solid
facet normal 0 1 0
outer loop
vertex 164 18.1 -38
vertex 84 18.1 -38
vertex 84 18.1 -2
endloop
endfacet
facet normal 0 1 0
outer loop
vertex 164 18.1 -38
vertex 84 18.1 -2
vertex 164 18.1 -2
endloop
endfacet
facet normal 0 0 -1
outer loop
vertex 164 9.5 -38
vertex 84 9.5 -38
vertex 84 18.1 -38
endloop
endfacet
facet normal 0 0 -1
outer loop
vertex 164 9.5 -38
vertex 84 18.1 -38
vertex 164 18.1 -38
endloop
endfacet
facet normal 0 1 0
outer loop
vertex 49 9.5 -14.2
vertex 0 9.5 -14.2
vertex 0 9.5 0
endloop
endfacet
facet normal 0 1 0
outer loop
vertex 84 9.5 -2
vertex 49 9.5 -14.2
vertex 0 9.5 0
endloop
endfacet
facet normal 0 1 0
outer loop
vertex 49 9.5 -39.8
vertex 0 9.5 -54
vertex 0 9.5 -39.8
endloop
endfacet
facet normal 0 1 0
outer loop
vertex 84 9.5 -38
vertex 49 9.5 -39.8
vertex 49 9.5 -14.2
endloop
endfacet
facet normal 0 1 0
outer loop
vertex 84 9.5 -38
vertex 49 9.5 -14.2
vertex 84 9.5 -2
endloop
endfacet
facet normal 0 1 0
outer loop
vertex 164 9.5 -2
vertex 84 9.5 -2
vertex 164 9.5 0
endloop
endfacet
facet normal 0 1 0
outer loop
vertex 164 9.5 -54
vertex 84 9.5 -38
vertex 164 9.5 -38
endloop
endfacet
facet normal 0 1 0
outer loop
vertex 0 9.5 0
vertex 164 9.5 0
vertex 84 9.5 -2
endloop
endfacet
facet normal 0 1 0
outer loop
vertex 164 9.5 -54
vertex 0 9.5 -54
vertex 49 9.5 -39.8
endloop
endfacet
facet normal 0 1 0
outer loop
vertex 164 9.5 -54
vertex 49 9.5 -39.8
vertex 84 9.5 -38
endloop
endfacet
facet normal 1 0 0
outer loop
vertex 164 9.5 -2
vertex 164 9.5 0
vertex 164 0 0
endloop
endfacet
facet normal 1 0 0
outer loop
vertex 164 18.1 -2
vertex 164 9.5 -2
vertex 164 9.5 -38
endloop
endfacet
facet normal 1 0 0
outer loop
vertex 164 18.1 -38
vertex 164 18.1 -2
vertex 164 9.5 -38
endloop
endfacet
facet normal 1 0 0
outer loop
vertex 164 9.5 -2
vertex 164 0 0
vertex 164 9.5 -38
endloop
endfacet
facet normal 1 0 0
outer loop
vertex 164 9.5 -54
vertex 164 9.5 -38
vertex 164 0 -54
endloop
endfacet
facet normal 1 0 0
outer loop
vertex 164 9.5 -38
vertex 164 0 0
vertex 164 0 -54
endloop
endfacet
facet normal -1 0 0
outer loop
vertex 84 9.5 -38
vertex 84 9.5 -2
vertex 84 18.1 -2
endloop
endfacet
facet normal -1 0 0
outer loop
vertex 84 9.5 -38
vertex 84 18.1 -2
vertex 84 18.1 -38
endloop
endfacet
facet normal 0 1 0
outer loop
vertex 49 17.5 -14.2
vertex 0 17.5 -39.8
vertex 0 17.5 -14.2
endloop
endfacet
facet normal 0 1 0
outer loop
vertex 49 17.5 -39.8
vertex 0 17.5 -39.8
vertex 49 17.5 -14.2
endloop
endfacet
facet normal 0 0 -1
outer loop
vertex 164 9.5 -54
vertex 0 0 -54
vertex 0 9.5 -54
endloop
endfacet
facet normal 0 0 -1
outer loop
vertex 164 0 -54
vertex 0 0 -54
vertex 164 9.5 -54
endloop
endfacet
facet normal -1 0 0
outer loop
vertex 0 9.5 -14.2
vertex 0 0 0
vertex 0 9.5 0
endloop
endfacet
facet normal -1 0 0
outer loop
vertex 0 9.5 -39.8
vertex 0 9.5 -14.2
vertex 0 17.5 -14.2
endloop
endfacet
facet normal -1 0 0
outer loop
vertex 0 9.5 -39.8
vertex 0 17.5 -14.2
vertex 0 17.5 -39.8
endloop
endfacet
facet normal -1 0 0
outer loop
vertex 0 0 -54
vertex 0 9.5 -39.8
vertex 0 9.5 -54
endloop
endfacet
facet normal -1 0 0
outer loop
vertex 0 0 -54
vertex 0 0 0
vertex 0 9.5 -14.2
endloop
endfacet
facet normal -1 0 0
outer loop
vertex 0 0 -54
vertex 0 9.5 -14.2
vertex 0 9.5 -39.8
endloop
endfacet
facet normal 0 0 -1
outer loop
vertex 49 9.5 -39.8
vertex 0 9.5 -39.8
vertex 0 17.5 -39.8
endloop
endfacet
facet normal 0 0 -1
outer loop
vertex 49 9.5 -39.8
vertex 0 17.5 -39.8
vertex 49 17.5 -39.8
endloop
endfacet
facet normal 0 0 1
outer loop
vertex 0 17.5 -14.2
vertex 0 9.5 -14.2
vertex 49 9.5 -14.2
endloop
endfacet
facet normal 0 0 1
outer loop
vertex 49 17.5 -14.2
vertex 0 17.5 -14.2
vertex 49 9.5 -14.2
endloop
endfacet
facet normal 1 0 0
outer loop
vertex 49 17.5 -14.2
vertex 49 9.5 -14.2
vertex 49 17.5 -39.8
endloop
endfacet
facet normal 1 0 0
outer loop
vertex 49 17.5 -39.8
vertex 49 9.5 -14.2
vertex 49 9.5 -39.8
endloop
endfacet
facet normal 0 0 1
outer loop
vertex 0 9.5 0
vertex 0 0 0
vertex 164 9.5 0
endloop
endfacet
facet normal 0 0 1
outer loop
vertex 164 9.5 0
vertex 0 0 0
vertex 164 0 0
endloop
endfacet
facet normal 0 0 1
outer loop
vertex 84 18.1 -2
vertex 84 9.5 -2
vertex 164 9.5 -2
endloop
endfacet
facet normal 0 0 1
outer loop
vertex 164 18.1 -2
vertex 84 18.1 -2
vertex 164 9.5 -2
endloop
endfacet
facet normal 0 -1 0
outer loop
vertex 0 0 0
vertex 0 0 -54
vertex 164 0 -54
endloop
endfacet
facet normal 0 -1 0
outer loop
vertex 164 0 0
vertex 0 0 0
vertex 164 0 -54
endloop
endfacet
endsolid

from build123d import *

# Parameters (mm, degrees)
SKETCH1_W           = 164
SKETCH1_H           = 54
BOSS_EXTRUDE1_DEPTH = 9.5
SKETCH3_W           = 49
SKETCH3_H           = 25.6
BOSS_EXTRUDE2_DEPTH = 8
SKETCH5_W           = 80
SKETCH5_H           = 36
BOSS_EXTRUDE3_DEPTH = 8.6


with BuildPart() as part:
    # Sketch1 → Boss-Extrude1 (new body)
    with BuildSketch(Plane(origin=(0, 0, 0), x_dir=(1, 0, 0), z_dir=(0, 1, 0))):
        with Locations((82, 27)):
            Rectangle(SKETCH1_W, SKETCH1_H)
    extrude(amount=BOSS_EXTRUDE1_DEPTH)

    # Sketch3 → Boss-Extrude2 (add)
    with BuildSketch(Plane(origin=(0, 9.5, 0), x_dir=(1, 0, 0), z_dir=(0, 1, 0))):
        with Locations((24.5, 27)):
            Rectangle(SKETCH3_W, SKETCH3_H)
    extrude(amount=BOSS_EXTRUDE2_DEPTH)

    # Sketch5 → Boss-Extrude3 (add)
    with BuildSketch(Plane(origin=(0, 9.5, 0), x_dir=(1, 0, 0), z_dir=(0, 1, 0))):
        with Locations((124, 20)):
            Rectangle(SKETCH5_W, SKETCH5_H)
    extrude(amount=BOSS_EXTRUDE3_DEPTH)


solid = part.part
